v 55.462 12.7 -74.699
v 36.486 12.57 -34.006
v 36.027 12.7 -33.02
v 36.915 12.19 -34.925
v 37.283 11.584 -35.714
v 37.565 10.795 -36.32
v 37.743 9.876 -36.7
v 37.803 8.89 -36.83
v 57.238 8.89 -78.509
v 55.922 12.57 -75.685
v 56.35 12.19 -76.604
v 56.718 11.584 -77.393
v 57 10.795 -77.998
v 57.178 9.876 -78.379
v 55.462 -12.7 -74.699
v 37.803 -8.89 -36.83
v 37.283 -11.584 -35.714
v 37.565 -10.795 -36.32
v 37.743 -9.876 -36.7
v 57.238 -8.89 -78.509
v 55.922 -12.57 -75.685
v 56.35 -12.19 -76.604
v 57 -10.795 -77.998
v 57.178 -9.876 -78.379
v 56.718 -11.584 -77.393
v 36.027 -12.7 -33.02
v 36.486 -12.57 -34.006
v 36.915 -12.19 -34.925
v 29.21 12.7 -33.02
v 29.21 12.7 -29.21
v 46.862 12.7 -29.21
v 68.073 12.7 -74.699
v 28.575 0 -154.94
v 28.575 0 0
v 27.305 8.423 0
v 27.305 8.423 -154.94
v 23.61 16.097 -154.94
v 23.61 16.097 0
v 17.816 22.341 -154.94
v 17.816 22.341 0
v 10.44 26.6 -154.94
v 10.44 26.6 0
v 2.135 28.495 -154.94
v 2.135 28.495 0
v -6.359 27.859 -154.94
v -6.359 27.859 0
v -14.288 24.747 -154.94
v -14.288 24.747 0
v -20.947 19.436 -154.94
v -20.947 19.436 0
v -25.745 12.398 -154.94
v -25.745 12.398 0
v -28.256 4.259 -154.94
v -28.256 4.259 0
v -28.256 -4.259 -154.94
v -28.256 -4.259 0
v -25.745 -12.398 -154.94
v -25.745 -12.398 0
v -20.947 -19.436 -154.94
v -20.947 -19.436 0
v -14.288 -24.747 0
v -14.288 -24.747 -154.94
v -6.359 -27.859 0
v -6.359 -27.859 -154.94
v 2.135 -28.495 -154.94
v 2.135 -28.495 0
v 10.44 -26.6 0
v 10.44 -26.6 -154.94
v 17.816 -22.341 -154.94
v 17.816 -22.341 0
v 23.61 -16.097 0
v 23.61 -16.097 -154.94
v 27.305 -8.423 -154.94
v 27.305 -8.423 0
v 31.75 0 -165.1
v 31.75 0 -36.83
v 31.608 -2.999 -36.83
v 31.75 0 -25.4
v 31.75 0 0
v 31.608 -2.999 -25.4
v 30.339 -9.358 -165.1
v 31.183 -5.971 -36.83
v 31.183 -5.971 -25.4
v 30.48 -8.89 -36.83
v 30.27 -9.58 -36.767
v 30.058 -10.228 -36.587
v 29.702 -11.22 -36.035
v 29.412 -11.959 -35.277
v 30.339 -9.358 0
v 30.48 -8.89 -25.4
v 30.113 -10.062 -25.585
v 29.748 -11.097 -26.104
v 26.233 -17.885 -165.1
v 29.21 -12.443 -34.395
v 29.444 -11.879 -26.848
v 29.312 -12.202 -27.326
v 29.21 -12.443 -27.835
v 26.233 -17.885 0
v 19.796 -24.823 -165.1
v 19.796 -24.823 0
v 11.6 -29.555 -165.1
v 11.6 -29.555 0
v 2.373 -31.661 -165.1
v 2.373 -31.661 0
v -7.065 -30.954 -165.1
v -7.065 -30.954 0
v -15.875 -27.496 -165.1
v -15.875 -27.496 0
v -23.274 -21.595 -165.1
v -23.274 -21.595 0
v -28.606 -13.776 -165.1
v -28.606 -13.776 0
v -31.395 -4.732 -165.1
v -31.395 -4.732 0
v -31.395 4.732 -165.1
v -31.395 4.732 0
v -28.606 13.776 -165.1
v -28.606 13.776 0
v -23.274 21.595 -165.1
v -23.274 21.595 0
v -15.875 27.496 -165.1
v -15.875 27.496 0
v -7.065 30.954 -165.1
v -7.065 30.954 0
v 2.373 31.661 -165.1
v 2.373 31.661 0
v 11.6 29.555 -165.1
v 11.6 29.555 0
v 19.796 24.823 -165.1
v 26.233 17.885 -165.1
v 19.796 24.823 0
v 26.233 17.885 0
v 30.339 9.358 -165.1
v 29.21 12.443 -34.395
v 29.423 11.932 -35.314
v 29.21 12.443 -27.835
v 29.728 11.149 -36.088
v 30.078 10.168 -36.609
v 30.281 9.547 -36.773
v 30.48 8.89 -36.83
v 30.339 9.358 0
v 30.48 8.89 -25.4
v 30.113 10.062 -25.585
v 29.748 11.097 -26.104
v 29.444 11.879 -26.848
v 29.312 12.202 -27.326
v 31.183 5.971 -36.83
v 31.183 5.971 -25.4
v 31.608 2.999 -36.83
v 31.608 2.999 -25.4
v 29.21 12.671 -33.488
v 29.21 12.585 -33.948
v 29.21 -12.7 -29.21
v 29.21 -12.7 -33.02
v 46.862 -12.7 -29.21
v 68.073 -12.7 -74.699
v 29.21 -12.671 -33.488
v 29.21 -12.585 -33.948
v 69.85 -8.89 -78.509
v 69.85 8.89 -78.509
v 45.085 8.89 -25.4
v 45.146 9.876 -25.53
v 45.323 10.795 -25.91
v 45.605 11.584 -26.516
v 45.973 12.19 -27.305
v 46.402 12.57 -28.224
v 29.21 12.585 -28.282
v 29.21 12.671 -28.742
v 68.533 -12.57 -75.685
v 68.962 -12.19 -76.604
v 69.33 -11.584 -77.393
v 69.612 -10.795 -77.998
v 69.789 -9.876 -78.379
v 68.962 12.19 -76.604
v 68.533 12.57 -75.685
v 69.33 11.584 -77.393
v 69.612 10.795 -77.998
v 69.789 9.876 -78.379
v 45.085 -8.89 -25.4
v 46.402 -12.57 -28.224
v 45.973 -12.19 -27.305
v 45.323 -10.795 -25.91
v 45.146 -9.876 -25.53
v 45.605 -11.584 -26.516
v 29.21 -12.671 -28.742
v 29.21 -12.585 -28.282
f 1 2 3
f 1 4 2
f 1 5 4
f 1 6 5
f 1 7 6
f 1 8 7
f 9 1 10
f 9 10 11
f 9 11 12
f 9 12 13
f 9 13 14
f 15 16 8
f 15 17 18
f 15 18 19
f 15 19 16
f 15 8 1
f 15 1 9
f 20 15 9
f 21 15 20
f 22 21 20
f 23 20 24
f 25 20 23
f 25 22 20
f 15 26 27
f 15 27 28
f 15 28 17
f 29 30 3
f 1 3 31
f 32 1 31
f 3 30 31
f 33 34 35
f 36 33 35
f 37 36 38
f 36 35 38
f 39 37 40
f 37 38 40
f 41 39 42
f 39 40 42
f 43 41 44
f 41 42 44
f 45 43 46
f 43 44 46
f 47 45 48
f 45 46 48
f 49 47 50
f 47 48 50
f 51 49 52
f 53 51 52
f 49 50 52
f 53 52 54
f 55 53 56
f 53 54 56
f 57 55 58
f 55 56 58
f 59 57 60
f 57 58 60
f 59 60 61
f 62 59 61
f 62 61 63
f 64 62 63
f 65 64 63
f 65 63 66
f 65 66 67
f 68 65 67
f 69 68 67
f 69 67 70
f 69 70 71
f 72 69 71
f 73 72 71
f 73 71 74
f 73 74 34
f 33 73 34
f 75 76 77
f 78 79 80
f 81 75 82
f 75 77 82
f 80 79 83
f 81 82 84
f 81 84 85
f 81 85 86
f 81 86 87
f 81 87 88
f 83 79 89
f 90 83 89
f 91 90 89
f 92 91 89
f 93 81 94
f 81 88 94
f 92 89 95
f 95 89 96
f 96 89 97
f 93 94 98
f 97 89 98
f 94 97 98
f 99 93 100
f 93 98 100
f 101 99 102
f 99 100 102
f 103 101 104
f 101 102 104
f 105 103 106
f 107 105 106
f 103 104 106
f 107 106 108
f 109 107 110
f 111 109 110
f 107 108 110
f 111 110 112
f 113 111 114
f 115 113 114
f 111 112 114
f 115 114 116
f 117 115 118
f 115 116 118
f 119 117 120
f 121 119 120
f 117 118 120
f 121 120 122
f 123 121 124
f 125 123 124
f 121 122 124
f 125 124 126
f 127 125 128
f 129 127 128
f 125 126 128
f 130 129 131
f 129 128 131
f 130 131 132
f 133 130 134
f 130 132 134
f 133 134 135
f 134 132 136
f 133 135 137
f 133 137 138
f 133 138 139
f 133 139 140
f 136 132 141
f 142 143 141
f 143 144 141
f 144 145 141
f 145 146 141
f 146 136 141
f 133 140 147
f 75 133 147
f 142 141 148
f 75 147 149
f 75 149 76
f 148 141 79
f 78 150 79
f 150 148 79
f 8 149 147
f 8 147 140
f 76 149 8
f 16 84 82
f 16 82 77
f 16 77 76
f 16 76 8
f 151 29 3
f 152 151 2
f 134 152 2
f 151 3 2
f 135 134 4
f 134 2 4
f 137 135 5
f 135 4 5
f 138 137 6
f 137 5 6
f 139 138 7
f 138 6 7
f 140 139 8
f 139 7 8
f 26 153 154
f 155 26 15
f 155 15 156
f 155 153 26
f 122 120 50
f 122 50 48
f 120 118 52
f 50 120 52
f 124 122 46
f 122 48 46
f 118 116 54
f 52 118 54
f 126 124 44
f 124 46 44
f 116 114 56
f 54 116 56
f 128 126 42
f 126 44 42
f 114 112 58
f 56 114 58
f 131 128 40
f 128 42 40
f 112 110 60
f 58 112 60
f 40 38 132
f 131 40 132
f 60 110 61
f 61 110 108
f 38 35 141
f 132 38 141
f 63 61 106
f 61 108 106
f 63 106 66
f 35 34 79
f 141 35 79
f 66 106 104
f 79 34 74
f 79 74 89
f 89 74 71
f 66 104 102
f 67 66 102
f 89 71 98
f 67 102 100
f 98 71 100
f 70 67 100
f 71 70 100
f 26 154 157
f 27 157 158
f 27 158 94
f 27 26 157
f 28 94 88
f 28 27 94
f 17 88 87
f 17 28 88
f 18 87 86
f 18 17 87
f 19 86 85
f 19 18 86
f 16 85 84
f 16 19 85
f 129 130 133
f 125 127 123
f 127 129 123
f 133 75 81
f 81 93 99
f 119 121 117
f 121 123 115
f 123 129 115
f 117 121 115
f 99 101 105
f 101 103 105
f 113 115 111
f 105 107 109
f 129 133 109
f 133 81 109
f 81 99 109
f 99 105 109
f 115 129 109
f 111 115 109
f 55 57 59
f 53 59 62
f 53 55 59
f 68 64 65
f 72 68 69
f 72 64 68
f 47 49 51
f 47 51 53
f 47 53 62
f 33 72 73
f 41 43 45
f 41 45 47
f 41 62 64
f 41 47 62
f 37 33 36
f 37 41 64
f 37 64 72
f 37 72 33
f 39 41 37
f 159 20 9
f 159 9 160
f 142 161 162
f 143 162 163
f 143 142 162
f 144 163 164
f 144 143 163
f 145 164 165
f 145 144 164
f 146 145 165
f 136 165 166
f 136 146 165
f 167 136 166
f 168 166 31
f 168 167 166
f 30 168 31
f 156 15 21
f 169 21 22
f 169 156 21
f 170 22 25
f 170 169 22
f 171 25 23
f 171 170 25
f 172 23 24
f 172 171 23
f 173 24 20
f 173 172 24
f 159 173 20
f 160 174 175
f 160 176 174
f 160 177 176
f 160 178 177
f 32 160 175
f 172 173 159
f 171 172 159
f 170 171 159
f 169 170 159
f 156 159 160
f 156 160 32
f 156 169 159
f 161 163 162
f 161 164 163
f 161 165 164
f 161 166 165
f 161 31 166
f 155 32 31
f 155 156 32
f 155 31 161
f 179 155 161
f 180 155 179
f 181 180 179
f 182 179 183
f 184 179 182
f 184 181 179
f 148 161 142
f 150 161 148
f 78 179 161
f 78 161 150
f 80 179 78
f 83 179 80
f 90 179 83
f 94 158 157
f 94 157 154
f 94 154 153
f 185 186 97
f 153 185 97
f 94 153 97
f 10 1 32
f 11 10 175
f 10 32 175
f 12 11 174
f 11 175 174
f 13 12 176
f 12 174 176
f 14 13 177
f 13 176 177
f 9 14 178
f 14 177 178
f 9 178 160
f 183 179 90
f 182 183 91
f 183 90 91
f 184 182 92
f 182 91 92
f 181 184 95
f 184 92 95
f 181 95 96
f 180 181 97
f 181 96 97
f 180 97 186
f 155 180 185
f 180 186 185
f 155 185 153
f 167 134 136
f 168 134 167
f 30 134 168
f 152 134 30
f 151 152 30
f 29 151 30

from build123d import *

# Parameters (mm, degrees)
F0_W      = 2.54
F0_H      = 11.43
F2_DEPTH  = 12.7
F3_R      = 3.81
F4_R      = 28.575
F5_DEPTH  = 76.2
F5_FACE_R = 28.575
F6_DEPTH  = 78.74


with BuildPart() as f1:
    # F0 (on Front) → F1 (revolve)
    with BuildSketch(Plane.XZ):
        Polygon((31.75, 0), (0, 0), (0, -165.1), (31.75, -165.1), (31.75, -36.83), (29.21, -36.83), (29.21, -25.4), (31.75, -25.4), align=None)
        with Locations((30.48, -31.115)):
            Rectangle(F0_W, F0_H)
    revolve(axis=Axis((0, 0, -82.55), (0, 0, -1)))

    # F0 (on Front) → F2 (join, symmetric)
    with BuildSketch(Plane.XZ):
        Polygon((45.085, -25.4), (31.75, -25.4), (31.75, -36.83), (37.803287, -36.83), (57.23839, -78.508714), (69.85, -78.508714), align=None)
        with Locations((30.48, -31.115)):
            Rectangle(F0_W, F0_H)
    extrude(amount=F2_DEPTH, both=True)

    # F3
    f3_edges = [f1.edges().sort_by_distance(p)[0] for p in [
        (37.1475, -12.7, -25.4),
        (37.1475, 12.7, -25.4),
        (33.506643, 12.7, -36.83),
        (33.506643, -12.7, -36.83),
        (63.544195, -12.7, -78.508714),
        (63.544195, 12.7, -78.508714),
    ]]
    fillet(f3_edges, radius=F3_R)

    # F4 (on face) → F5 (cut)
    with BuildSketch(Plane.XY):
        Circle(F4_R)
    extrude(amount=-F5_DEPTH, mode=Mode.SUBTRACT)

    # F5_face (on face) → F6 (cut)
    with BuildSketch(Plane.XY.offset(-76.2)):
        Circle(F5_FACE_R)
    extrude(amount=-F6_DEPTH, mode=Mode.SUBTRACT)


solid = f1.part
